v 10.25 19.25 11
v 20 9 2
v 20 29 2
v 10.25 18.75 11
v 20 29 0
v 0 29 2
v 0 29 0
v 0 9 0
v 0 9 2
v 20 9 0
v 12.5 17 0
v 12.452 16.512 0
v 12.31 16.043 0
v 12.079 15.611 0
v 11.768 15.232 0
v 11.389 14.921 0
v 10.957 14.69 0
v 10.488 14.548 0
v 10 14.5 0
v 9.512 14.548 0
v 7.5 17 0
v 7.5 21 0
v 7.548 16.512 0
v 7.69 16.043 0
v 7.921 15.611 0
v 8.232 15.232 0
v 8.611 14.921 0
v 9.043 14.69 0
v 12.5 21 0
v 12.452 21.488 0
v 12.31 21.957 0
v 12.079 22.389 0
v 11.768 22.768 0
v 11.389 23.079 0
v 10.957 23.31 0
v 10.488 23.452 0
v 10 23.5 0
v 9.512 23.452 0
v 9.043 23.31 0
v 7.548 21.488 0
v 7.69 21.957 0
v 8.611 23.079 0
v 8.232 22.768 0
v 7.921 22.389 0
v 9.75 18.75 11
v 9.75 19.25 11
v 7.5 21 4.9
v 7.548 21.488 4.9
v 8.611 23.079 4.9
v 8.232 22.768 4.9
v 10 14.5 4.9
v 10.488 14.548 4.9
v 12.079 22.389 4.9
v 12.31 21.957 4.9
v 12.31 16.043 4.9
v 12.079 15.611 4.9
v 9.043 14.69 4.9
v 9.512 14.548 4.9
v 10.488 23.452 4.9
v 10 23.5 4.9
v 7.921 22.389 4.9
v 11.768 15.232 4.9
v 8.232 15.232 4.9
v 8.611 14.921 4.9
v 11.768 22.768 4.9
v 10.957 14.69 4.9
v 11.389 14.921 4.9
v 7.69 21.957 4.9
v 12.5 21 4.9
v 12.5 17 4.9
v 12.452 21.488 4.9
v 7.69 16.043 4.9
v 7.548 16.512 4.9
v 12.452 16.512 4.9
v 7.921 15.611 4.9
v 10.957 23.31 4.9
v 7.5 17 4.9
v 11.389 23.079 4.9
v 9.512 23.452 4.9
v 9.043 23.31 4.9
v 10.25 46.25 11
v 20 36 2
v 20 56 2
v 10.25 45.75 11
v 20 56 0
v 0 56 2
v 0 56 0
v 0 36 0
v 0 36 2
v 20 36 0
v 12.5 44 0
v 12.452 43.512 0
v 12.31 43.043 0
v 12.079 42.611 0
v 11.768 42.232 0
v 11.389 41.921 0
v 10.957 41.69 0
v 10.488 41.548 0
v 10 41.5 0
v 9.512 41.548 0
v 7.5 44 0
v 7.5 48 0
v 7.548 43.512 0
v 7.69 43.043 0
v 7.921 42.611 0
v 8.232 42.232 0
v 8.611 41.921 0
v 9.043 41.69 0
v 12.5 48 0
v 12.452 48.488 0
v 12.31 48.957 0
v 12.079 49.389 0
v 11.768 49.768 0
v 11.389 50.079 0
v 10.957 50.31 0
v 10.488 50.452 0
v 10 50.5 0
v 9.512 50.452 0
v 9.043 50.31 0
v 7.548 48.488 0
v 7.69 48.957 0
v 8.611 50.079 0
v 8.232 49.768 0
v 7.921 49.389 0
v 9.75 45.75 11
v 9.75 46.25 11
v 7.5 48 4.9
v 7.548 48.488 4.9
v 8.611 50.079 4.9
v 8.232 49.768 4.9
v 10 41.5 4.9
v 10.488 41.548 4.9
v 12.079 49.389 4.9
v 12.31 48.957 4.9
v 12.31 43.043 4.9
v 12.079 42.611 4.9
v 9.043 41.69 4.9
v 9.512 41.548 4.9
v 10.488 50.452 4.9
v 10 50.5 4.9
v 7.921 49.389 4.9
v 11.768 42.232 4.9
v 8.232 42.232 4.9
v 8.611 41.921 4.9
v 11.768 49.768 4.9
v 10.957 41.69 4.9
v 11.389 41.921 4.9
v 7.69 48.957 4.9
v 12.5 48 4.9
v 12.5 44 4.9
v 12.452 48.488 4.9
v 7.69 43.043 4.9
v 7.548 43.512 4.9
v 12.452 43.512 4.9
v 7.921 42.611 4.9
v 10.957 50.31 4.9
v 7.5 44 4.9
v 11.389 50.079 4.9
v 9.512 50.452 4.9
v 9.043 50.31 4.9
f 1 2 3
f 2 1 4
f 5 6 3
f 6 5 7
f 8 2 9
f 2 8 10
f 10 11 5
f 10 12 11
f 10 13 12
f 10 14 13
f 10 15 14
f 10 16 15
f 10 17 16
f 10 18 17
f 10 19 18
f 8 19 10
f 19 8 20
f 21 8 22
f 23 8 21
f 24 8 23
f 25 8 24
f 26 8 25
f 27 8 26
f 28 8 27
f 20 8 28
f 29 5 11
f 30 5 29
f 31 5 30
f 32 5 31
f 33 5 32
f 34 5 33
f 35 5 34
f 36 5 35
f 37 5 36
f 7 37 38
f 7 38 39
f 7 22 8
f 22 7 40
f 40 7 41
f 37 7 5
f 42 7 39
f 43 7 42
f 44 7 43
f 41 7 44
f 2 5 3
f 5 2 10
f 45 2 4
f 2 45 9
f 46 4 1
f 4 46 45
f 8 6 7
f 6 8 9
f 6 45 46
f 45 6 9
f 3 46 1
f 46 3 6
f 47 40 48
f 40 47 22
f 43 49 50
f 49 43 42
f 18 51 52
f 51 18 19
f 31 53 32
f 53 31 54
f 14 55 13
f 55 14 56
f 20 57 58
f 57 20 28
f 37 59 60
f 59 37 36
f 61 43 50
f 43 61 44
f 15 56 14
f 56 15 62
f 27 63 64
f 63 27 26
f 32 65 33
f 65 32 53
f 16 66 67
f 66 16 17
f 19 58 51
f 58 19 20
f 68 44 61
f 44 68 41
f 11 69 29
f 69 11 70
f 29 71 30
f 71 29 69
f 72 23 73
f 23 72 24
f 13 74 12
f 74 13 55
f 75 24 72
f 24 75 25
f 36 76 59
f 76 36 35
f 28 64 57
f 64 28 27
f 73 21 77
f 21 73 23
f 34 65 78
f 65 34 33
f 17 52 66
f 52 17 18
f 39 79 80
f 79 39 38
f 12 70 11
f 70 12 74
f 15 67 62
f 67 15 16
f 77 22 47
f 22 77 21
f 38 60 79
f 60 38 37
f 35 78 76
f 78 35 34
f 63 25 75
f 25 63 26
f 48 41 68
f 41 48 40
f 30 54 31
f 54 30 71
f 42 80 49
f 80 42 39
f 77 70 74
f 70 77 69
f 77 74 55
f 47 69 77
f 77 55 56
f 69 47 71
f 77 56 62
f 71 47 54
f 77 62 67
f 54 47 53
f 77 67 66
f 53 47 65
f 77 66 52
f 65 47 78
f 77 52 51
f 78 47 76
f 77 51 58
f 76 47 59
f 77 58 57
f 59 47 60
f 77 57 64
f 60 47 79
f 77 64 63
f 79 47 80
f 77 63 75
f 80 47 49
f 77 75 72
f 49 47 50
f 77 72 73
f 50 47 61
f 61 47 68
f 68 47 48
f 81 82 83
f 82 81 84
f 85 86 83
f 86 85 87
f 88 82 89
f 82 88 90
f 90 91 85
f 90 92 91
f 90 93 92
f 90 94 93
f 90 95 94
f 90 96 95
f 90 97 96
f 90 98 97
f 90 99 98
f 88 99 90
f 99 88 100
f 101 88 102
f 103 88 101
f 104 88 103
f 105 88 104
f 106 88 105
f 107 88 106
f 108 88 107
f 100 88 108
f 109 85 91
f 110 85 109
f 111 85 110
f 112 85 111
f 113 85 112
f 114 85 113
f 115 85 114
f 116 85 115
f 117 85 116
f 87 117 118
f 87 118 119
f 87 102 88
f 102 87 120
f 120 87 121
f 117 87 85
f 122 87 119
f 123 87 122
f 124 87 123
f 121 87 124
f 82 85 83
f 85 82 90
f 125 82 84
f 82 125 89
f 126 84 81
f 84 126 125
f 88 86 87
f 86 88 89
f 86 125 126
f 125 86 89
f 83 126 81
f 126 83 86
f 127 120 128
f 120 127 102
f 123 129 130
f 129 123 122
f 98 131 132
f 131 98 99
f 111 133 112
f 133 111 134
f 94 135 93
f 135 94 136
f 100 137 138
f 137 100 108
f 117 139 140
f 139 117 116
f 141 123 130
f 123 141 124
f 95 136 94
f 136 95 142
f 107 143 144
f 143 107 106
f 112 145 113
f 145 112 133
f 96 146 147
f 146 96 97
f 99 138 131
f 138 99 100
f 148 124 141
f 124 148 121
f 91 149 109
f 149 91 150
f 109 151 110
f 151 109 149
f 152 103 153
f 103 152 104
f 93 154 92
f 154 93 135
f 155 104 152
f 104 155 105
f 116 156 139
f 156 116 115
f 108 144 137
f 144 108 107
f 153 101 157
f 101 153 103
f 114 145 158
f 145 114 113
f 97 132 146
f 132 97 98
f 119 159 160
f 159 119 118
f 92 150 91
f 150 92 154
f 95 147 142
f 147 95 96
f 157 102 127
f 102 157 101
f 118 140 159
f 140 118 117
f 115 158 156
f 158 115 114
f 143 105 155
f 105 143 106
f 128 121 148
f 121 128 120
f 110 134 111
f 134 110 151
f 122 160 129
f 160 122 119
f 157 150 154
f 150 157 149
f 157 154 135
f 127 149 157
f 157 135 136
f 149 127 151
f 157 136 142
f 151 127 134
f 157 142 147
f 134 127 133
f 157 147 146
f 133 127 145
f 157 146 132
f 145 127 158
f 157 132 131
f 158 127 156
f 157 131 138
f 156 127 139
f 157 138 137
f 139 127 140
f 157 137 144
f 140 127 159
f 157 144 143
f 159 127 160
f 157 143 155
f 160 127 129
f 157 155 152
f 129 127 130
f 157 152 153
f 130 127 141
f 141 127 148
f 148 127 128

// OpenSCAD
spikeW=20;
spikeSideD=9;
spikeH=11;
postH=5;
$fn=32;

spikes();
// translate([0,0,-1]) color("black") cube([600,65,1]);

// translate([20,0,0]) spikes();
// translate([70,0,0]) spikes();
// translate([120,0,0]) spikes();
// post();

module spikes() {
  translate([0,spikeSideD,0]) spike();
  translate([0,65-spikeW-spikeSideD,0]) spike();
}

module spike() {
  // color("silver") rotate([0,0,45]) cylinder(r1=spikeR, r2=0.1,h=spikeH, $fn=4);
  color("silver") 
  difference() {
    hull() {
      cube([spikeW,spikeW,2]);
      translate([spikeW/2-0.25,spikeW/2-0.25,0]) cube([0.5,0.5,spikeH]);
    }
    translate([spikeW/2,spikeW/2,0]) post();
  }
}

module post() {
  hull() {
    translate([0,2,-0.1]) cylinder(r=2.5, h=postH);
    translate([0,-2,-0.1]) cylinder(r=2.5, h=postH);
  }
}
